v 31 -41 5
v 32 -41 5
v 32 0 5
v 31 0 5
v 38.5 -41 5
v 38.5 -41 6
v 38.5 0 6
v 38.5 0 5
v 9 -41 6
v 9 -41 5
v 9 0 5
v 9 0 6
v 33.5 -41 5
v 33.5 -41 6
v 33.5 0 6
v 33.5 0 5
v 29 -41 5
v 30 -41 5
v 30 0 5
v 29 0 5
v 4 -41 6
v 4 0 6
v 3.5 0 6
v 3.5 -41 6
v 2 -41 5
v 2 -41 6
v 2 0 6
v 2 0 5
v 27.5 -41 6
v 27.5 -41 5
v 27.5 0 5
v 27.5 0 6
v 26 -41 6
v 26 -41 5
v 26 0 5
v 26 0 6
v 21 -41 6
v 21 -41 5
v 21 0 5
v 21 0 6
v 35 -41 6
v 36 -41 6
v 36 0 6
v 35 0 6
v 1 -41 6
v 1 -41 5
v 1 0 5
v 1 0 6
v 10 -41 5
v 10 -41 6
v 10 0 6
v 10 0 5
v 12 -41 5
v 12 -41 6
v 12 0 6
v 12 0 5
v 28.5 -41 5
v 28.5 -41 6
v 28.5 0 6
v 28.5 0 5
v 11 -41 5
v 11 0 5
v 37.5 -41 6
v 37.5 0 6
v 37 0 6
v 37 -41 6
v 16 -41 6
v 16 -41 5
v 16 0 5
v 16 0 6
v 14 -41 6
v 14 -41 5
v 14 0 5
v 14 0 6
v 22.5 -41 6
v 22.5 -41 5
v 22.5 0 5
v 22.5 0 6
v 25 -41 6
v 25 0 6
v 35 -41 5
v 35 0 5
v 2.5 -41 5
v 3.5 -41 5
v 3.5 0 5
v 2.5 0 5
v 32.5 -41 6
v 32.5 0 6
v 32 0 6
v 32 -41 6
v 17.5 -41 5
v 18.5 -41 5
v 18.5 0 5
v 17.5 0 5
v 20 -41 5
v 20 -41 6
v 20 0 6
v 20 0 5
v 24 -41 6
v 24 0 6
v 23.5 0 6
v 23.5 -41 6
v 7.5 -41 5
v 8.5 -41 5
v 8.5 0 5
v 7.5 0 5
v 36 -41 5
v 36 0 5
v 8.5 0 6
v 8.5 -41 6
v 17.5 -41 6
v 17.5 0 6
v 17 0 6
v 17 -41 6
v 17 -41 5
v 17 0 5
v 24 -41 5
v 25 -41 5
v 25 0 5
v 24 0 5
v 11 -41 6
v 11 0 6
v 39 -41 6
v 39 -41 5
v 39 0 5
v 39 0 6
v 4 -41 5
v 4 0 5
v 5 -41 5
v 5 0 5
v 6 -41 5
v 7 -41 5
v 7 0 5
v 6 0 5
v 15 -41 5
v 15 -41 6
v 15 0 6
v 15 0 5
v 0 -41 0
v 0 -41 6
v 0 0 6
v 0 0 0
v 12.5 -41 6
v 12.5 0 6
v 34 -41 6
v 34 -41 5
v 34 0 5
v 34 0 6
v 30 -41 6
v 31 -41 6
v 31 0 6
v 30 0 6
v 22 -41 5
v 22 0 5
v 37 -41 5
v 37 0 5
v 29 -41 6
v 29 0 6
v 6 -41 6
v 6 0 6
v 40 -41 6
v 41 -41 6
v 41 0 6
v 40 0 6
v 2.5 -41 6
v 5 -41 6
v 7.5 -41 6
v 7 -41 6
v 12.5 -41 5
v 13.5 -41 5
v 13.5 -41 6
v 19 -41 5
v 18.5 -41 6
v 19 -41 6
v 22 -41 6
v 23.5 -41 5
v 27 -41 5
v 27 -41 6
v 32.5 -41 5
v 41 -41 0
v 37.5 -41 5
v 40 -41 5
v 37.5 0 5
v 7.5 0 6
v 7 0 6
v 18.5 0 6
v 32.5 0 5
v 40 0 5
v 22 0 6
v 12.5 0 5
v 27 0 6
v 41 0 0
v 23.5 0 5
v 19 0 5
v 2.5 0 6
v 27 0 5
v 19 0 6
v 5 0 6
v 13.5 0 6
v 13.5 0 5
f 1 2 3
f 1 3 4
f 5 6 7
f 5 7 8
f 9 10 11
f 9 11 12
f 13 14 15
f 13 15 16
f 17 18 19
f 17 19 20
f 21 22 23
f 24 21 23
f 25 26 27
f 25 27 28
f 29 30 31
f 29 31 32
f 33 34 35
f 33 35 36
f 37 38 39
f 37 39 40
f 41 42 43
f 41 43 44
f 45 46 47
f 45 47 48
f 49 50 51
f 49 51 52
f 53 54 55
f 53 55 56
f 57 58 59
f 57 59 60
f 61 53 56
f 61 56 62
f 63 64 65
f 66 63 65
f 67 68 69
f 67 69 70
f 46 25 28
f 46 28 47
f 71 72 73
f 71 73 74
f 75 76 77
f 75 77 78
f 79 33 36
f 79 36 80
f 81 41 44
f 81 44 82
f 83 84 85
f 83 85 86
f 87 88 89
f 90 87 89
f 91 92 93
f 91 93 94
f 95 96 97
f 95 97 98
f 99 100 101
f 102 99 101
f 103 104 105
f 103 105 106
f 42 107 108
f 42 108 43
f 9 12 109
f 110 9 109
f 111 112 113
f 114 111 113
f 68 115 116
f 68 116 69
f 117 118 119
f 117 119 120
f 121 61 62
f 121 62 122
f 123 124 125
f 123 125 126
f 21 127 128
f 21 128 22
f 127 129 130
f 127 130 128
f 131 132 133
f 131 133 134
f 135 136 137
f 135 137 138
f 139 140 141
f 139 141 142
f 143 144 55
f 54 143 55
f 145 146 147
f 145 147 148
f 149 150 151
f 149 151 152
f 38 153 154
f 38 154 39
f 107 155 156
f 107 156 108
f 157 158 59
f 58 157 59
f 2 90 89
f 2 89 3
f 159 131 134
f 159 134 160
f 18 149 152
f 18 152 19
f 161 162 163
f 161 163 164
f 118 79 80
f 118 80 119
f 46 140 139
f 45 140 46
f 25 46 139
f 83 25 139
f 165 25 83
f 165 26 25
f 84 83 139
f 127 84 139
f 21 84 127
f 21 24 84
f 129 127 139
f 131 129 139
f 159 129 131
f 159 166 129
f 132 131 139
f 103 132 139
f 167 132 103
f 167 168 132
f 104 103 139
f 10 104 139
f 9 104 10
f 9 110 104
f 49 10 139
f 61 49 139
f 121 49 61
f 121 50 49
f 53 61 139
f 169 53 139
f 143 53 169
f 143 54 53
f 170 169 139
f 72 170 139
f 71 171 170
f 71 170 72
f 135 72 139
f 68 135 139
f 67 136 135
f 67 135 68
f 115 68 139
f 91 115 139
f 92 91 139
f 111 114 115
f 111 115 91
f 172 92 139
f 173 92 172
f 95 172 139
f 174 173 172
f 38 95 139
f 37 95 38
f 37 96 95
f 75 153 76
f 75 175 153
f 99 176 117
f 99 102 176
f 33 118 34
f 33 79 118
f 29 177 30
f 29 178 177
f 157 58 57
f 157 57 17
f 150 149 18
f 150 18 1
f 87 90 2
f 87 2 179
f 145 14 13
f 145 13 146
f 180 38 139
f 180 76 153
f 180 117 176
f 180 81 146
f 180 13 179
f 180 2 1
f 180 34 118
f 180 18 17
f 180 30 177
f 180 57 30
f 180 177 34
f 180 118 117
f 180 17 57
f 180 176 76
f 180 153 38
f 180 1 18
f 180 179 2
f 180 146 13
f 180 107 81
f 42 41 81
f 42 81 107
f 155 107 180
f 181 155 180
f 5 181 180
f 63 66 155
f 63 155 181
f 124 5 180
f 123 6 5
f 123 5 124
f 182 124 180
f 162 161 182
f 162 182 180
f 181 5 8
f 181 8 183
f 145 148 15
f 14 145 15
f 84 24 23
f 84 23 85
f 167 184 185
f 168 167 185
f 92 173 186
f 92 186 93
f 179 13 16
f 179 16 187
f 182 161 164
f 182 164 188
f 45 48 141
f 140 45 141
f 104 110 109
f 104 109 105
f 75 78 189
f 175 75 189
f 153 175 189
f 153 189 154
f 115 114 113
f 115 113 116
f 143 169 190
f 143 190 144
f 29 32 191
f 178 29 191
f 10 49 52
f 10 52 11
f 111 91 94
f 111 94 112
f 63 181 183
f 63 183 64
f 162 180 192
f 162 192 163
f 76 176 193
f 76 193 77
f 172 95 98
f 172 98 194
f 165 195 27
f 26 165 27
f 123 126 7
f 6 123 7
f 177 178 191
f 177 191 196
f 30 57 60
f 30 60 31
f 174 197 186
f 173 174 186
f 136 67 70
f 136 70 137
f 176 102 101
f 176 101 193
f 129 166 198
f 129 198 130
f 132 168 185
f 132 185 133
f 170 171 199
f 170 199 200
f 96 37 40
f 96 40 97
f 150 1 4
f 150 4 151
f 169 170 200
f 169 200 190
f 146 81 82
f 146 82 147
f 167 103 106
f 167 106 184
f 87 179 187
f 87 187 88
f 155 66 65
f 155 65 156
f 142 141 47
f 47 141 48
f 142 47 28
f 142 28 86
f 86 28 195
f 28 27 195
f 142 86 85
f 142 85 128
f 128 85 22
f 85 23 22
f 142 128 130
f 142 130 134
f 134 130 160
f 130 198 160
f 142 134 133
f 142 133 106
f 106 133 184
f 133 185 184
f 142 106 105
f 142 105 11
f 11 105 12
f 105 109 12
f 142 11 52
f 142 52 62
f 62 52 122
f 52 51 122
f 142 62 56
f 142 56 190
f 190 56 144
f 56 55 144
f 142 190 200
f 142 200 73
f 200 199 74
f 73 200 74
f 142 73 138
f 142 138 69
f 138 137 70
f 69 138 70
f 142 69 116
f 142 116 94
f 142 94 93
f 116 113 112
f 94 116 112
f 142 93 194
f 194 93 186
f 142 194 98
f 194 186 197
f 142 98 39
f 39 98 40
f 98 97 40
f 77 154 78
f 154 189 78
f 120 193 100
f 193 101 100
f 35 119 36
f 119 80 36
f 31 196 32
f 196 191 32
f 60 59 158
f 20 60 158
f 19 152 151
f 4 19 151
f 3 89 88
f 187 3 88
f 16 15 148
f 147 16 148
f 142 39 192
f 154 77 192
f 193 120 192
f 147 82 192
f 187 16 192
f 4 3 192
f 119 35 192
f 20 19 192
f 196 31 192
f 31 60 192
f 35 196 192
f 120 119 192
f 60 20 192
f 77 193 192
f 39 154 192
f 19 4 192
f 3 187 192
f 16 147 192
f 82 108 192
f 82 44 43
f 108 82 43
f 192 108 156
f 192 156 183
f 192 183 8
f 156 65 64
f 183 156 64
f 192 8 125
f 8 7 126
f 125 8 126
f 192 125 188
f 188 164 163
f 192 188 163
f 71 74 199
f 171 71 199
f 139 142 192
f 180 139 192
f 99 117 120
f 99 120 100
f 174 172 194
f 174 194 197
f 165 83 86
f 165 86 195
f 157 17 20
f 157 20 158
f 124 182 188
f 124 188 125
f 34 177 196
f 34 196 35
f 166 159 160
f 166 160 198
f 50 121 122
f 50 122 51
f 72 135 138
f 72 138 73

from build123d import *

# Parameters (mm, degrees)
F1_DEPTH = 41


with BuildPart() as f1:
    # F0 (on Front) → F1 (new body)
    with BuildSketch(Plane.XZ):
        Polygon((1, 6), (0, 6), (0, 0), (41, 0), (41, 6), (40, 6), (40, 5), (39, 5), (39, 6), (38.5, 6), (38.5, 5), (37.5, 5), (37.5, 6), (37, 6), (37, 5), (36, 5), (36, 6), (35, 6), (35, 5), (34, 5), (34, 6), (33.5, 6), (33.5, 5), (32.5, 5), (32.5, 6), (32, 6), (32, 5), (31, 5), (31, 6), (30, 6), (30, 5), (29, 5), (29, 6), (28.5, 6), (28.5, 5), (27.5, 5), (27.5, 6), (27, 6), (27, 5), (26, 5), (26, 6), (25, 6), (25, 5), (24, 5), (24, 6), (23.5, 6), (23.5, 5), (22.5, 5), (22.5, 6), (22, 6), (22, 5), (21, 5), (21, 6), (20, 6), (20, 5), (19, 5), (19, 6), (18.5, 6), (18.5, 5), (17.5, 5), (17.5, 6), (17, 6), (17, 5), (16, 5), (16, 6), (15, 6), (15, 5), (14, 5), (14, 6), (13.5, 6), (13.5, 5), (12.5, 5), (12.5, 6), (12, 6), (12, 5), (11, 5), (11, 6), (10, 6), (10, 5), (9, 5), (9, 6), (8.5, 6), (8.5, 5), (7.5, 5), (7.5, 6), (7, 6), (7, 5), (6, 5), (6, 6), (5, 6), (5, 5), (4, 5), (4, 6), (3.5, 6), (3.5, 5), (2.5, 5), (2.5, 6), (2, 6), (2, 5), (1, 5), align=None)
    extrude(amount=F1_DEPTH)


solid = f1.part
